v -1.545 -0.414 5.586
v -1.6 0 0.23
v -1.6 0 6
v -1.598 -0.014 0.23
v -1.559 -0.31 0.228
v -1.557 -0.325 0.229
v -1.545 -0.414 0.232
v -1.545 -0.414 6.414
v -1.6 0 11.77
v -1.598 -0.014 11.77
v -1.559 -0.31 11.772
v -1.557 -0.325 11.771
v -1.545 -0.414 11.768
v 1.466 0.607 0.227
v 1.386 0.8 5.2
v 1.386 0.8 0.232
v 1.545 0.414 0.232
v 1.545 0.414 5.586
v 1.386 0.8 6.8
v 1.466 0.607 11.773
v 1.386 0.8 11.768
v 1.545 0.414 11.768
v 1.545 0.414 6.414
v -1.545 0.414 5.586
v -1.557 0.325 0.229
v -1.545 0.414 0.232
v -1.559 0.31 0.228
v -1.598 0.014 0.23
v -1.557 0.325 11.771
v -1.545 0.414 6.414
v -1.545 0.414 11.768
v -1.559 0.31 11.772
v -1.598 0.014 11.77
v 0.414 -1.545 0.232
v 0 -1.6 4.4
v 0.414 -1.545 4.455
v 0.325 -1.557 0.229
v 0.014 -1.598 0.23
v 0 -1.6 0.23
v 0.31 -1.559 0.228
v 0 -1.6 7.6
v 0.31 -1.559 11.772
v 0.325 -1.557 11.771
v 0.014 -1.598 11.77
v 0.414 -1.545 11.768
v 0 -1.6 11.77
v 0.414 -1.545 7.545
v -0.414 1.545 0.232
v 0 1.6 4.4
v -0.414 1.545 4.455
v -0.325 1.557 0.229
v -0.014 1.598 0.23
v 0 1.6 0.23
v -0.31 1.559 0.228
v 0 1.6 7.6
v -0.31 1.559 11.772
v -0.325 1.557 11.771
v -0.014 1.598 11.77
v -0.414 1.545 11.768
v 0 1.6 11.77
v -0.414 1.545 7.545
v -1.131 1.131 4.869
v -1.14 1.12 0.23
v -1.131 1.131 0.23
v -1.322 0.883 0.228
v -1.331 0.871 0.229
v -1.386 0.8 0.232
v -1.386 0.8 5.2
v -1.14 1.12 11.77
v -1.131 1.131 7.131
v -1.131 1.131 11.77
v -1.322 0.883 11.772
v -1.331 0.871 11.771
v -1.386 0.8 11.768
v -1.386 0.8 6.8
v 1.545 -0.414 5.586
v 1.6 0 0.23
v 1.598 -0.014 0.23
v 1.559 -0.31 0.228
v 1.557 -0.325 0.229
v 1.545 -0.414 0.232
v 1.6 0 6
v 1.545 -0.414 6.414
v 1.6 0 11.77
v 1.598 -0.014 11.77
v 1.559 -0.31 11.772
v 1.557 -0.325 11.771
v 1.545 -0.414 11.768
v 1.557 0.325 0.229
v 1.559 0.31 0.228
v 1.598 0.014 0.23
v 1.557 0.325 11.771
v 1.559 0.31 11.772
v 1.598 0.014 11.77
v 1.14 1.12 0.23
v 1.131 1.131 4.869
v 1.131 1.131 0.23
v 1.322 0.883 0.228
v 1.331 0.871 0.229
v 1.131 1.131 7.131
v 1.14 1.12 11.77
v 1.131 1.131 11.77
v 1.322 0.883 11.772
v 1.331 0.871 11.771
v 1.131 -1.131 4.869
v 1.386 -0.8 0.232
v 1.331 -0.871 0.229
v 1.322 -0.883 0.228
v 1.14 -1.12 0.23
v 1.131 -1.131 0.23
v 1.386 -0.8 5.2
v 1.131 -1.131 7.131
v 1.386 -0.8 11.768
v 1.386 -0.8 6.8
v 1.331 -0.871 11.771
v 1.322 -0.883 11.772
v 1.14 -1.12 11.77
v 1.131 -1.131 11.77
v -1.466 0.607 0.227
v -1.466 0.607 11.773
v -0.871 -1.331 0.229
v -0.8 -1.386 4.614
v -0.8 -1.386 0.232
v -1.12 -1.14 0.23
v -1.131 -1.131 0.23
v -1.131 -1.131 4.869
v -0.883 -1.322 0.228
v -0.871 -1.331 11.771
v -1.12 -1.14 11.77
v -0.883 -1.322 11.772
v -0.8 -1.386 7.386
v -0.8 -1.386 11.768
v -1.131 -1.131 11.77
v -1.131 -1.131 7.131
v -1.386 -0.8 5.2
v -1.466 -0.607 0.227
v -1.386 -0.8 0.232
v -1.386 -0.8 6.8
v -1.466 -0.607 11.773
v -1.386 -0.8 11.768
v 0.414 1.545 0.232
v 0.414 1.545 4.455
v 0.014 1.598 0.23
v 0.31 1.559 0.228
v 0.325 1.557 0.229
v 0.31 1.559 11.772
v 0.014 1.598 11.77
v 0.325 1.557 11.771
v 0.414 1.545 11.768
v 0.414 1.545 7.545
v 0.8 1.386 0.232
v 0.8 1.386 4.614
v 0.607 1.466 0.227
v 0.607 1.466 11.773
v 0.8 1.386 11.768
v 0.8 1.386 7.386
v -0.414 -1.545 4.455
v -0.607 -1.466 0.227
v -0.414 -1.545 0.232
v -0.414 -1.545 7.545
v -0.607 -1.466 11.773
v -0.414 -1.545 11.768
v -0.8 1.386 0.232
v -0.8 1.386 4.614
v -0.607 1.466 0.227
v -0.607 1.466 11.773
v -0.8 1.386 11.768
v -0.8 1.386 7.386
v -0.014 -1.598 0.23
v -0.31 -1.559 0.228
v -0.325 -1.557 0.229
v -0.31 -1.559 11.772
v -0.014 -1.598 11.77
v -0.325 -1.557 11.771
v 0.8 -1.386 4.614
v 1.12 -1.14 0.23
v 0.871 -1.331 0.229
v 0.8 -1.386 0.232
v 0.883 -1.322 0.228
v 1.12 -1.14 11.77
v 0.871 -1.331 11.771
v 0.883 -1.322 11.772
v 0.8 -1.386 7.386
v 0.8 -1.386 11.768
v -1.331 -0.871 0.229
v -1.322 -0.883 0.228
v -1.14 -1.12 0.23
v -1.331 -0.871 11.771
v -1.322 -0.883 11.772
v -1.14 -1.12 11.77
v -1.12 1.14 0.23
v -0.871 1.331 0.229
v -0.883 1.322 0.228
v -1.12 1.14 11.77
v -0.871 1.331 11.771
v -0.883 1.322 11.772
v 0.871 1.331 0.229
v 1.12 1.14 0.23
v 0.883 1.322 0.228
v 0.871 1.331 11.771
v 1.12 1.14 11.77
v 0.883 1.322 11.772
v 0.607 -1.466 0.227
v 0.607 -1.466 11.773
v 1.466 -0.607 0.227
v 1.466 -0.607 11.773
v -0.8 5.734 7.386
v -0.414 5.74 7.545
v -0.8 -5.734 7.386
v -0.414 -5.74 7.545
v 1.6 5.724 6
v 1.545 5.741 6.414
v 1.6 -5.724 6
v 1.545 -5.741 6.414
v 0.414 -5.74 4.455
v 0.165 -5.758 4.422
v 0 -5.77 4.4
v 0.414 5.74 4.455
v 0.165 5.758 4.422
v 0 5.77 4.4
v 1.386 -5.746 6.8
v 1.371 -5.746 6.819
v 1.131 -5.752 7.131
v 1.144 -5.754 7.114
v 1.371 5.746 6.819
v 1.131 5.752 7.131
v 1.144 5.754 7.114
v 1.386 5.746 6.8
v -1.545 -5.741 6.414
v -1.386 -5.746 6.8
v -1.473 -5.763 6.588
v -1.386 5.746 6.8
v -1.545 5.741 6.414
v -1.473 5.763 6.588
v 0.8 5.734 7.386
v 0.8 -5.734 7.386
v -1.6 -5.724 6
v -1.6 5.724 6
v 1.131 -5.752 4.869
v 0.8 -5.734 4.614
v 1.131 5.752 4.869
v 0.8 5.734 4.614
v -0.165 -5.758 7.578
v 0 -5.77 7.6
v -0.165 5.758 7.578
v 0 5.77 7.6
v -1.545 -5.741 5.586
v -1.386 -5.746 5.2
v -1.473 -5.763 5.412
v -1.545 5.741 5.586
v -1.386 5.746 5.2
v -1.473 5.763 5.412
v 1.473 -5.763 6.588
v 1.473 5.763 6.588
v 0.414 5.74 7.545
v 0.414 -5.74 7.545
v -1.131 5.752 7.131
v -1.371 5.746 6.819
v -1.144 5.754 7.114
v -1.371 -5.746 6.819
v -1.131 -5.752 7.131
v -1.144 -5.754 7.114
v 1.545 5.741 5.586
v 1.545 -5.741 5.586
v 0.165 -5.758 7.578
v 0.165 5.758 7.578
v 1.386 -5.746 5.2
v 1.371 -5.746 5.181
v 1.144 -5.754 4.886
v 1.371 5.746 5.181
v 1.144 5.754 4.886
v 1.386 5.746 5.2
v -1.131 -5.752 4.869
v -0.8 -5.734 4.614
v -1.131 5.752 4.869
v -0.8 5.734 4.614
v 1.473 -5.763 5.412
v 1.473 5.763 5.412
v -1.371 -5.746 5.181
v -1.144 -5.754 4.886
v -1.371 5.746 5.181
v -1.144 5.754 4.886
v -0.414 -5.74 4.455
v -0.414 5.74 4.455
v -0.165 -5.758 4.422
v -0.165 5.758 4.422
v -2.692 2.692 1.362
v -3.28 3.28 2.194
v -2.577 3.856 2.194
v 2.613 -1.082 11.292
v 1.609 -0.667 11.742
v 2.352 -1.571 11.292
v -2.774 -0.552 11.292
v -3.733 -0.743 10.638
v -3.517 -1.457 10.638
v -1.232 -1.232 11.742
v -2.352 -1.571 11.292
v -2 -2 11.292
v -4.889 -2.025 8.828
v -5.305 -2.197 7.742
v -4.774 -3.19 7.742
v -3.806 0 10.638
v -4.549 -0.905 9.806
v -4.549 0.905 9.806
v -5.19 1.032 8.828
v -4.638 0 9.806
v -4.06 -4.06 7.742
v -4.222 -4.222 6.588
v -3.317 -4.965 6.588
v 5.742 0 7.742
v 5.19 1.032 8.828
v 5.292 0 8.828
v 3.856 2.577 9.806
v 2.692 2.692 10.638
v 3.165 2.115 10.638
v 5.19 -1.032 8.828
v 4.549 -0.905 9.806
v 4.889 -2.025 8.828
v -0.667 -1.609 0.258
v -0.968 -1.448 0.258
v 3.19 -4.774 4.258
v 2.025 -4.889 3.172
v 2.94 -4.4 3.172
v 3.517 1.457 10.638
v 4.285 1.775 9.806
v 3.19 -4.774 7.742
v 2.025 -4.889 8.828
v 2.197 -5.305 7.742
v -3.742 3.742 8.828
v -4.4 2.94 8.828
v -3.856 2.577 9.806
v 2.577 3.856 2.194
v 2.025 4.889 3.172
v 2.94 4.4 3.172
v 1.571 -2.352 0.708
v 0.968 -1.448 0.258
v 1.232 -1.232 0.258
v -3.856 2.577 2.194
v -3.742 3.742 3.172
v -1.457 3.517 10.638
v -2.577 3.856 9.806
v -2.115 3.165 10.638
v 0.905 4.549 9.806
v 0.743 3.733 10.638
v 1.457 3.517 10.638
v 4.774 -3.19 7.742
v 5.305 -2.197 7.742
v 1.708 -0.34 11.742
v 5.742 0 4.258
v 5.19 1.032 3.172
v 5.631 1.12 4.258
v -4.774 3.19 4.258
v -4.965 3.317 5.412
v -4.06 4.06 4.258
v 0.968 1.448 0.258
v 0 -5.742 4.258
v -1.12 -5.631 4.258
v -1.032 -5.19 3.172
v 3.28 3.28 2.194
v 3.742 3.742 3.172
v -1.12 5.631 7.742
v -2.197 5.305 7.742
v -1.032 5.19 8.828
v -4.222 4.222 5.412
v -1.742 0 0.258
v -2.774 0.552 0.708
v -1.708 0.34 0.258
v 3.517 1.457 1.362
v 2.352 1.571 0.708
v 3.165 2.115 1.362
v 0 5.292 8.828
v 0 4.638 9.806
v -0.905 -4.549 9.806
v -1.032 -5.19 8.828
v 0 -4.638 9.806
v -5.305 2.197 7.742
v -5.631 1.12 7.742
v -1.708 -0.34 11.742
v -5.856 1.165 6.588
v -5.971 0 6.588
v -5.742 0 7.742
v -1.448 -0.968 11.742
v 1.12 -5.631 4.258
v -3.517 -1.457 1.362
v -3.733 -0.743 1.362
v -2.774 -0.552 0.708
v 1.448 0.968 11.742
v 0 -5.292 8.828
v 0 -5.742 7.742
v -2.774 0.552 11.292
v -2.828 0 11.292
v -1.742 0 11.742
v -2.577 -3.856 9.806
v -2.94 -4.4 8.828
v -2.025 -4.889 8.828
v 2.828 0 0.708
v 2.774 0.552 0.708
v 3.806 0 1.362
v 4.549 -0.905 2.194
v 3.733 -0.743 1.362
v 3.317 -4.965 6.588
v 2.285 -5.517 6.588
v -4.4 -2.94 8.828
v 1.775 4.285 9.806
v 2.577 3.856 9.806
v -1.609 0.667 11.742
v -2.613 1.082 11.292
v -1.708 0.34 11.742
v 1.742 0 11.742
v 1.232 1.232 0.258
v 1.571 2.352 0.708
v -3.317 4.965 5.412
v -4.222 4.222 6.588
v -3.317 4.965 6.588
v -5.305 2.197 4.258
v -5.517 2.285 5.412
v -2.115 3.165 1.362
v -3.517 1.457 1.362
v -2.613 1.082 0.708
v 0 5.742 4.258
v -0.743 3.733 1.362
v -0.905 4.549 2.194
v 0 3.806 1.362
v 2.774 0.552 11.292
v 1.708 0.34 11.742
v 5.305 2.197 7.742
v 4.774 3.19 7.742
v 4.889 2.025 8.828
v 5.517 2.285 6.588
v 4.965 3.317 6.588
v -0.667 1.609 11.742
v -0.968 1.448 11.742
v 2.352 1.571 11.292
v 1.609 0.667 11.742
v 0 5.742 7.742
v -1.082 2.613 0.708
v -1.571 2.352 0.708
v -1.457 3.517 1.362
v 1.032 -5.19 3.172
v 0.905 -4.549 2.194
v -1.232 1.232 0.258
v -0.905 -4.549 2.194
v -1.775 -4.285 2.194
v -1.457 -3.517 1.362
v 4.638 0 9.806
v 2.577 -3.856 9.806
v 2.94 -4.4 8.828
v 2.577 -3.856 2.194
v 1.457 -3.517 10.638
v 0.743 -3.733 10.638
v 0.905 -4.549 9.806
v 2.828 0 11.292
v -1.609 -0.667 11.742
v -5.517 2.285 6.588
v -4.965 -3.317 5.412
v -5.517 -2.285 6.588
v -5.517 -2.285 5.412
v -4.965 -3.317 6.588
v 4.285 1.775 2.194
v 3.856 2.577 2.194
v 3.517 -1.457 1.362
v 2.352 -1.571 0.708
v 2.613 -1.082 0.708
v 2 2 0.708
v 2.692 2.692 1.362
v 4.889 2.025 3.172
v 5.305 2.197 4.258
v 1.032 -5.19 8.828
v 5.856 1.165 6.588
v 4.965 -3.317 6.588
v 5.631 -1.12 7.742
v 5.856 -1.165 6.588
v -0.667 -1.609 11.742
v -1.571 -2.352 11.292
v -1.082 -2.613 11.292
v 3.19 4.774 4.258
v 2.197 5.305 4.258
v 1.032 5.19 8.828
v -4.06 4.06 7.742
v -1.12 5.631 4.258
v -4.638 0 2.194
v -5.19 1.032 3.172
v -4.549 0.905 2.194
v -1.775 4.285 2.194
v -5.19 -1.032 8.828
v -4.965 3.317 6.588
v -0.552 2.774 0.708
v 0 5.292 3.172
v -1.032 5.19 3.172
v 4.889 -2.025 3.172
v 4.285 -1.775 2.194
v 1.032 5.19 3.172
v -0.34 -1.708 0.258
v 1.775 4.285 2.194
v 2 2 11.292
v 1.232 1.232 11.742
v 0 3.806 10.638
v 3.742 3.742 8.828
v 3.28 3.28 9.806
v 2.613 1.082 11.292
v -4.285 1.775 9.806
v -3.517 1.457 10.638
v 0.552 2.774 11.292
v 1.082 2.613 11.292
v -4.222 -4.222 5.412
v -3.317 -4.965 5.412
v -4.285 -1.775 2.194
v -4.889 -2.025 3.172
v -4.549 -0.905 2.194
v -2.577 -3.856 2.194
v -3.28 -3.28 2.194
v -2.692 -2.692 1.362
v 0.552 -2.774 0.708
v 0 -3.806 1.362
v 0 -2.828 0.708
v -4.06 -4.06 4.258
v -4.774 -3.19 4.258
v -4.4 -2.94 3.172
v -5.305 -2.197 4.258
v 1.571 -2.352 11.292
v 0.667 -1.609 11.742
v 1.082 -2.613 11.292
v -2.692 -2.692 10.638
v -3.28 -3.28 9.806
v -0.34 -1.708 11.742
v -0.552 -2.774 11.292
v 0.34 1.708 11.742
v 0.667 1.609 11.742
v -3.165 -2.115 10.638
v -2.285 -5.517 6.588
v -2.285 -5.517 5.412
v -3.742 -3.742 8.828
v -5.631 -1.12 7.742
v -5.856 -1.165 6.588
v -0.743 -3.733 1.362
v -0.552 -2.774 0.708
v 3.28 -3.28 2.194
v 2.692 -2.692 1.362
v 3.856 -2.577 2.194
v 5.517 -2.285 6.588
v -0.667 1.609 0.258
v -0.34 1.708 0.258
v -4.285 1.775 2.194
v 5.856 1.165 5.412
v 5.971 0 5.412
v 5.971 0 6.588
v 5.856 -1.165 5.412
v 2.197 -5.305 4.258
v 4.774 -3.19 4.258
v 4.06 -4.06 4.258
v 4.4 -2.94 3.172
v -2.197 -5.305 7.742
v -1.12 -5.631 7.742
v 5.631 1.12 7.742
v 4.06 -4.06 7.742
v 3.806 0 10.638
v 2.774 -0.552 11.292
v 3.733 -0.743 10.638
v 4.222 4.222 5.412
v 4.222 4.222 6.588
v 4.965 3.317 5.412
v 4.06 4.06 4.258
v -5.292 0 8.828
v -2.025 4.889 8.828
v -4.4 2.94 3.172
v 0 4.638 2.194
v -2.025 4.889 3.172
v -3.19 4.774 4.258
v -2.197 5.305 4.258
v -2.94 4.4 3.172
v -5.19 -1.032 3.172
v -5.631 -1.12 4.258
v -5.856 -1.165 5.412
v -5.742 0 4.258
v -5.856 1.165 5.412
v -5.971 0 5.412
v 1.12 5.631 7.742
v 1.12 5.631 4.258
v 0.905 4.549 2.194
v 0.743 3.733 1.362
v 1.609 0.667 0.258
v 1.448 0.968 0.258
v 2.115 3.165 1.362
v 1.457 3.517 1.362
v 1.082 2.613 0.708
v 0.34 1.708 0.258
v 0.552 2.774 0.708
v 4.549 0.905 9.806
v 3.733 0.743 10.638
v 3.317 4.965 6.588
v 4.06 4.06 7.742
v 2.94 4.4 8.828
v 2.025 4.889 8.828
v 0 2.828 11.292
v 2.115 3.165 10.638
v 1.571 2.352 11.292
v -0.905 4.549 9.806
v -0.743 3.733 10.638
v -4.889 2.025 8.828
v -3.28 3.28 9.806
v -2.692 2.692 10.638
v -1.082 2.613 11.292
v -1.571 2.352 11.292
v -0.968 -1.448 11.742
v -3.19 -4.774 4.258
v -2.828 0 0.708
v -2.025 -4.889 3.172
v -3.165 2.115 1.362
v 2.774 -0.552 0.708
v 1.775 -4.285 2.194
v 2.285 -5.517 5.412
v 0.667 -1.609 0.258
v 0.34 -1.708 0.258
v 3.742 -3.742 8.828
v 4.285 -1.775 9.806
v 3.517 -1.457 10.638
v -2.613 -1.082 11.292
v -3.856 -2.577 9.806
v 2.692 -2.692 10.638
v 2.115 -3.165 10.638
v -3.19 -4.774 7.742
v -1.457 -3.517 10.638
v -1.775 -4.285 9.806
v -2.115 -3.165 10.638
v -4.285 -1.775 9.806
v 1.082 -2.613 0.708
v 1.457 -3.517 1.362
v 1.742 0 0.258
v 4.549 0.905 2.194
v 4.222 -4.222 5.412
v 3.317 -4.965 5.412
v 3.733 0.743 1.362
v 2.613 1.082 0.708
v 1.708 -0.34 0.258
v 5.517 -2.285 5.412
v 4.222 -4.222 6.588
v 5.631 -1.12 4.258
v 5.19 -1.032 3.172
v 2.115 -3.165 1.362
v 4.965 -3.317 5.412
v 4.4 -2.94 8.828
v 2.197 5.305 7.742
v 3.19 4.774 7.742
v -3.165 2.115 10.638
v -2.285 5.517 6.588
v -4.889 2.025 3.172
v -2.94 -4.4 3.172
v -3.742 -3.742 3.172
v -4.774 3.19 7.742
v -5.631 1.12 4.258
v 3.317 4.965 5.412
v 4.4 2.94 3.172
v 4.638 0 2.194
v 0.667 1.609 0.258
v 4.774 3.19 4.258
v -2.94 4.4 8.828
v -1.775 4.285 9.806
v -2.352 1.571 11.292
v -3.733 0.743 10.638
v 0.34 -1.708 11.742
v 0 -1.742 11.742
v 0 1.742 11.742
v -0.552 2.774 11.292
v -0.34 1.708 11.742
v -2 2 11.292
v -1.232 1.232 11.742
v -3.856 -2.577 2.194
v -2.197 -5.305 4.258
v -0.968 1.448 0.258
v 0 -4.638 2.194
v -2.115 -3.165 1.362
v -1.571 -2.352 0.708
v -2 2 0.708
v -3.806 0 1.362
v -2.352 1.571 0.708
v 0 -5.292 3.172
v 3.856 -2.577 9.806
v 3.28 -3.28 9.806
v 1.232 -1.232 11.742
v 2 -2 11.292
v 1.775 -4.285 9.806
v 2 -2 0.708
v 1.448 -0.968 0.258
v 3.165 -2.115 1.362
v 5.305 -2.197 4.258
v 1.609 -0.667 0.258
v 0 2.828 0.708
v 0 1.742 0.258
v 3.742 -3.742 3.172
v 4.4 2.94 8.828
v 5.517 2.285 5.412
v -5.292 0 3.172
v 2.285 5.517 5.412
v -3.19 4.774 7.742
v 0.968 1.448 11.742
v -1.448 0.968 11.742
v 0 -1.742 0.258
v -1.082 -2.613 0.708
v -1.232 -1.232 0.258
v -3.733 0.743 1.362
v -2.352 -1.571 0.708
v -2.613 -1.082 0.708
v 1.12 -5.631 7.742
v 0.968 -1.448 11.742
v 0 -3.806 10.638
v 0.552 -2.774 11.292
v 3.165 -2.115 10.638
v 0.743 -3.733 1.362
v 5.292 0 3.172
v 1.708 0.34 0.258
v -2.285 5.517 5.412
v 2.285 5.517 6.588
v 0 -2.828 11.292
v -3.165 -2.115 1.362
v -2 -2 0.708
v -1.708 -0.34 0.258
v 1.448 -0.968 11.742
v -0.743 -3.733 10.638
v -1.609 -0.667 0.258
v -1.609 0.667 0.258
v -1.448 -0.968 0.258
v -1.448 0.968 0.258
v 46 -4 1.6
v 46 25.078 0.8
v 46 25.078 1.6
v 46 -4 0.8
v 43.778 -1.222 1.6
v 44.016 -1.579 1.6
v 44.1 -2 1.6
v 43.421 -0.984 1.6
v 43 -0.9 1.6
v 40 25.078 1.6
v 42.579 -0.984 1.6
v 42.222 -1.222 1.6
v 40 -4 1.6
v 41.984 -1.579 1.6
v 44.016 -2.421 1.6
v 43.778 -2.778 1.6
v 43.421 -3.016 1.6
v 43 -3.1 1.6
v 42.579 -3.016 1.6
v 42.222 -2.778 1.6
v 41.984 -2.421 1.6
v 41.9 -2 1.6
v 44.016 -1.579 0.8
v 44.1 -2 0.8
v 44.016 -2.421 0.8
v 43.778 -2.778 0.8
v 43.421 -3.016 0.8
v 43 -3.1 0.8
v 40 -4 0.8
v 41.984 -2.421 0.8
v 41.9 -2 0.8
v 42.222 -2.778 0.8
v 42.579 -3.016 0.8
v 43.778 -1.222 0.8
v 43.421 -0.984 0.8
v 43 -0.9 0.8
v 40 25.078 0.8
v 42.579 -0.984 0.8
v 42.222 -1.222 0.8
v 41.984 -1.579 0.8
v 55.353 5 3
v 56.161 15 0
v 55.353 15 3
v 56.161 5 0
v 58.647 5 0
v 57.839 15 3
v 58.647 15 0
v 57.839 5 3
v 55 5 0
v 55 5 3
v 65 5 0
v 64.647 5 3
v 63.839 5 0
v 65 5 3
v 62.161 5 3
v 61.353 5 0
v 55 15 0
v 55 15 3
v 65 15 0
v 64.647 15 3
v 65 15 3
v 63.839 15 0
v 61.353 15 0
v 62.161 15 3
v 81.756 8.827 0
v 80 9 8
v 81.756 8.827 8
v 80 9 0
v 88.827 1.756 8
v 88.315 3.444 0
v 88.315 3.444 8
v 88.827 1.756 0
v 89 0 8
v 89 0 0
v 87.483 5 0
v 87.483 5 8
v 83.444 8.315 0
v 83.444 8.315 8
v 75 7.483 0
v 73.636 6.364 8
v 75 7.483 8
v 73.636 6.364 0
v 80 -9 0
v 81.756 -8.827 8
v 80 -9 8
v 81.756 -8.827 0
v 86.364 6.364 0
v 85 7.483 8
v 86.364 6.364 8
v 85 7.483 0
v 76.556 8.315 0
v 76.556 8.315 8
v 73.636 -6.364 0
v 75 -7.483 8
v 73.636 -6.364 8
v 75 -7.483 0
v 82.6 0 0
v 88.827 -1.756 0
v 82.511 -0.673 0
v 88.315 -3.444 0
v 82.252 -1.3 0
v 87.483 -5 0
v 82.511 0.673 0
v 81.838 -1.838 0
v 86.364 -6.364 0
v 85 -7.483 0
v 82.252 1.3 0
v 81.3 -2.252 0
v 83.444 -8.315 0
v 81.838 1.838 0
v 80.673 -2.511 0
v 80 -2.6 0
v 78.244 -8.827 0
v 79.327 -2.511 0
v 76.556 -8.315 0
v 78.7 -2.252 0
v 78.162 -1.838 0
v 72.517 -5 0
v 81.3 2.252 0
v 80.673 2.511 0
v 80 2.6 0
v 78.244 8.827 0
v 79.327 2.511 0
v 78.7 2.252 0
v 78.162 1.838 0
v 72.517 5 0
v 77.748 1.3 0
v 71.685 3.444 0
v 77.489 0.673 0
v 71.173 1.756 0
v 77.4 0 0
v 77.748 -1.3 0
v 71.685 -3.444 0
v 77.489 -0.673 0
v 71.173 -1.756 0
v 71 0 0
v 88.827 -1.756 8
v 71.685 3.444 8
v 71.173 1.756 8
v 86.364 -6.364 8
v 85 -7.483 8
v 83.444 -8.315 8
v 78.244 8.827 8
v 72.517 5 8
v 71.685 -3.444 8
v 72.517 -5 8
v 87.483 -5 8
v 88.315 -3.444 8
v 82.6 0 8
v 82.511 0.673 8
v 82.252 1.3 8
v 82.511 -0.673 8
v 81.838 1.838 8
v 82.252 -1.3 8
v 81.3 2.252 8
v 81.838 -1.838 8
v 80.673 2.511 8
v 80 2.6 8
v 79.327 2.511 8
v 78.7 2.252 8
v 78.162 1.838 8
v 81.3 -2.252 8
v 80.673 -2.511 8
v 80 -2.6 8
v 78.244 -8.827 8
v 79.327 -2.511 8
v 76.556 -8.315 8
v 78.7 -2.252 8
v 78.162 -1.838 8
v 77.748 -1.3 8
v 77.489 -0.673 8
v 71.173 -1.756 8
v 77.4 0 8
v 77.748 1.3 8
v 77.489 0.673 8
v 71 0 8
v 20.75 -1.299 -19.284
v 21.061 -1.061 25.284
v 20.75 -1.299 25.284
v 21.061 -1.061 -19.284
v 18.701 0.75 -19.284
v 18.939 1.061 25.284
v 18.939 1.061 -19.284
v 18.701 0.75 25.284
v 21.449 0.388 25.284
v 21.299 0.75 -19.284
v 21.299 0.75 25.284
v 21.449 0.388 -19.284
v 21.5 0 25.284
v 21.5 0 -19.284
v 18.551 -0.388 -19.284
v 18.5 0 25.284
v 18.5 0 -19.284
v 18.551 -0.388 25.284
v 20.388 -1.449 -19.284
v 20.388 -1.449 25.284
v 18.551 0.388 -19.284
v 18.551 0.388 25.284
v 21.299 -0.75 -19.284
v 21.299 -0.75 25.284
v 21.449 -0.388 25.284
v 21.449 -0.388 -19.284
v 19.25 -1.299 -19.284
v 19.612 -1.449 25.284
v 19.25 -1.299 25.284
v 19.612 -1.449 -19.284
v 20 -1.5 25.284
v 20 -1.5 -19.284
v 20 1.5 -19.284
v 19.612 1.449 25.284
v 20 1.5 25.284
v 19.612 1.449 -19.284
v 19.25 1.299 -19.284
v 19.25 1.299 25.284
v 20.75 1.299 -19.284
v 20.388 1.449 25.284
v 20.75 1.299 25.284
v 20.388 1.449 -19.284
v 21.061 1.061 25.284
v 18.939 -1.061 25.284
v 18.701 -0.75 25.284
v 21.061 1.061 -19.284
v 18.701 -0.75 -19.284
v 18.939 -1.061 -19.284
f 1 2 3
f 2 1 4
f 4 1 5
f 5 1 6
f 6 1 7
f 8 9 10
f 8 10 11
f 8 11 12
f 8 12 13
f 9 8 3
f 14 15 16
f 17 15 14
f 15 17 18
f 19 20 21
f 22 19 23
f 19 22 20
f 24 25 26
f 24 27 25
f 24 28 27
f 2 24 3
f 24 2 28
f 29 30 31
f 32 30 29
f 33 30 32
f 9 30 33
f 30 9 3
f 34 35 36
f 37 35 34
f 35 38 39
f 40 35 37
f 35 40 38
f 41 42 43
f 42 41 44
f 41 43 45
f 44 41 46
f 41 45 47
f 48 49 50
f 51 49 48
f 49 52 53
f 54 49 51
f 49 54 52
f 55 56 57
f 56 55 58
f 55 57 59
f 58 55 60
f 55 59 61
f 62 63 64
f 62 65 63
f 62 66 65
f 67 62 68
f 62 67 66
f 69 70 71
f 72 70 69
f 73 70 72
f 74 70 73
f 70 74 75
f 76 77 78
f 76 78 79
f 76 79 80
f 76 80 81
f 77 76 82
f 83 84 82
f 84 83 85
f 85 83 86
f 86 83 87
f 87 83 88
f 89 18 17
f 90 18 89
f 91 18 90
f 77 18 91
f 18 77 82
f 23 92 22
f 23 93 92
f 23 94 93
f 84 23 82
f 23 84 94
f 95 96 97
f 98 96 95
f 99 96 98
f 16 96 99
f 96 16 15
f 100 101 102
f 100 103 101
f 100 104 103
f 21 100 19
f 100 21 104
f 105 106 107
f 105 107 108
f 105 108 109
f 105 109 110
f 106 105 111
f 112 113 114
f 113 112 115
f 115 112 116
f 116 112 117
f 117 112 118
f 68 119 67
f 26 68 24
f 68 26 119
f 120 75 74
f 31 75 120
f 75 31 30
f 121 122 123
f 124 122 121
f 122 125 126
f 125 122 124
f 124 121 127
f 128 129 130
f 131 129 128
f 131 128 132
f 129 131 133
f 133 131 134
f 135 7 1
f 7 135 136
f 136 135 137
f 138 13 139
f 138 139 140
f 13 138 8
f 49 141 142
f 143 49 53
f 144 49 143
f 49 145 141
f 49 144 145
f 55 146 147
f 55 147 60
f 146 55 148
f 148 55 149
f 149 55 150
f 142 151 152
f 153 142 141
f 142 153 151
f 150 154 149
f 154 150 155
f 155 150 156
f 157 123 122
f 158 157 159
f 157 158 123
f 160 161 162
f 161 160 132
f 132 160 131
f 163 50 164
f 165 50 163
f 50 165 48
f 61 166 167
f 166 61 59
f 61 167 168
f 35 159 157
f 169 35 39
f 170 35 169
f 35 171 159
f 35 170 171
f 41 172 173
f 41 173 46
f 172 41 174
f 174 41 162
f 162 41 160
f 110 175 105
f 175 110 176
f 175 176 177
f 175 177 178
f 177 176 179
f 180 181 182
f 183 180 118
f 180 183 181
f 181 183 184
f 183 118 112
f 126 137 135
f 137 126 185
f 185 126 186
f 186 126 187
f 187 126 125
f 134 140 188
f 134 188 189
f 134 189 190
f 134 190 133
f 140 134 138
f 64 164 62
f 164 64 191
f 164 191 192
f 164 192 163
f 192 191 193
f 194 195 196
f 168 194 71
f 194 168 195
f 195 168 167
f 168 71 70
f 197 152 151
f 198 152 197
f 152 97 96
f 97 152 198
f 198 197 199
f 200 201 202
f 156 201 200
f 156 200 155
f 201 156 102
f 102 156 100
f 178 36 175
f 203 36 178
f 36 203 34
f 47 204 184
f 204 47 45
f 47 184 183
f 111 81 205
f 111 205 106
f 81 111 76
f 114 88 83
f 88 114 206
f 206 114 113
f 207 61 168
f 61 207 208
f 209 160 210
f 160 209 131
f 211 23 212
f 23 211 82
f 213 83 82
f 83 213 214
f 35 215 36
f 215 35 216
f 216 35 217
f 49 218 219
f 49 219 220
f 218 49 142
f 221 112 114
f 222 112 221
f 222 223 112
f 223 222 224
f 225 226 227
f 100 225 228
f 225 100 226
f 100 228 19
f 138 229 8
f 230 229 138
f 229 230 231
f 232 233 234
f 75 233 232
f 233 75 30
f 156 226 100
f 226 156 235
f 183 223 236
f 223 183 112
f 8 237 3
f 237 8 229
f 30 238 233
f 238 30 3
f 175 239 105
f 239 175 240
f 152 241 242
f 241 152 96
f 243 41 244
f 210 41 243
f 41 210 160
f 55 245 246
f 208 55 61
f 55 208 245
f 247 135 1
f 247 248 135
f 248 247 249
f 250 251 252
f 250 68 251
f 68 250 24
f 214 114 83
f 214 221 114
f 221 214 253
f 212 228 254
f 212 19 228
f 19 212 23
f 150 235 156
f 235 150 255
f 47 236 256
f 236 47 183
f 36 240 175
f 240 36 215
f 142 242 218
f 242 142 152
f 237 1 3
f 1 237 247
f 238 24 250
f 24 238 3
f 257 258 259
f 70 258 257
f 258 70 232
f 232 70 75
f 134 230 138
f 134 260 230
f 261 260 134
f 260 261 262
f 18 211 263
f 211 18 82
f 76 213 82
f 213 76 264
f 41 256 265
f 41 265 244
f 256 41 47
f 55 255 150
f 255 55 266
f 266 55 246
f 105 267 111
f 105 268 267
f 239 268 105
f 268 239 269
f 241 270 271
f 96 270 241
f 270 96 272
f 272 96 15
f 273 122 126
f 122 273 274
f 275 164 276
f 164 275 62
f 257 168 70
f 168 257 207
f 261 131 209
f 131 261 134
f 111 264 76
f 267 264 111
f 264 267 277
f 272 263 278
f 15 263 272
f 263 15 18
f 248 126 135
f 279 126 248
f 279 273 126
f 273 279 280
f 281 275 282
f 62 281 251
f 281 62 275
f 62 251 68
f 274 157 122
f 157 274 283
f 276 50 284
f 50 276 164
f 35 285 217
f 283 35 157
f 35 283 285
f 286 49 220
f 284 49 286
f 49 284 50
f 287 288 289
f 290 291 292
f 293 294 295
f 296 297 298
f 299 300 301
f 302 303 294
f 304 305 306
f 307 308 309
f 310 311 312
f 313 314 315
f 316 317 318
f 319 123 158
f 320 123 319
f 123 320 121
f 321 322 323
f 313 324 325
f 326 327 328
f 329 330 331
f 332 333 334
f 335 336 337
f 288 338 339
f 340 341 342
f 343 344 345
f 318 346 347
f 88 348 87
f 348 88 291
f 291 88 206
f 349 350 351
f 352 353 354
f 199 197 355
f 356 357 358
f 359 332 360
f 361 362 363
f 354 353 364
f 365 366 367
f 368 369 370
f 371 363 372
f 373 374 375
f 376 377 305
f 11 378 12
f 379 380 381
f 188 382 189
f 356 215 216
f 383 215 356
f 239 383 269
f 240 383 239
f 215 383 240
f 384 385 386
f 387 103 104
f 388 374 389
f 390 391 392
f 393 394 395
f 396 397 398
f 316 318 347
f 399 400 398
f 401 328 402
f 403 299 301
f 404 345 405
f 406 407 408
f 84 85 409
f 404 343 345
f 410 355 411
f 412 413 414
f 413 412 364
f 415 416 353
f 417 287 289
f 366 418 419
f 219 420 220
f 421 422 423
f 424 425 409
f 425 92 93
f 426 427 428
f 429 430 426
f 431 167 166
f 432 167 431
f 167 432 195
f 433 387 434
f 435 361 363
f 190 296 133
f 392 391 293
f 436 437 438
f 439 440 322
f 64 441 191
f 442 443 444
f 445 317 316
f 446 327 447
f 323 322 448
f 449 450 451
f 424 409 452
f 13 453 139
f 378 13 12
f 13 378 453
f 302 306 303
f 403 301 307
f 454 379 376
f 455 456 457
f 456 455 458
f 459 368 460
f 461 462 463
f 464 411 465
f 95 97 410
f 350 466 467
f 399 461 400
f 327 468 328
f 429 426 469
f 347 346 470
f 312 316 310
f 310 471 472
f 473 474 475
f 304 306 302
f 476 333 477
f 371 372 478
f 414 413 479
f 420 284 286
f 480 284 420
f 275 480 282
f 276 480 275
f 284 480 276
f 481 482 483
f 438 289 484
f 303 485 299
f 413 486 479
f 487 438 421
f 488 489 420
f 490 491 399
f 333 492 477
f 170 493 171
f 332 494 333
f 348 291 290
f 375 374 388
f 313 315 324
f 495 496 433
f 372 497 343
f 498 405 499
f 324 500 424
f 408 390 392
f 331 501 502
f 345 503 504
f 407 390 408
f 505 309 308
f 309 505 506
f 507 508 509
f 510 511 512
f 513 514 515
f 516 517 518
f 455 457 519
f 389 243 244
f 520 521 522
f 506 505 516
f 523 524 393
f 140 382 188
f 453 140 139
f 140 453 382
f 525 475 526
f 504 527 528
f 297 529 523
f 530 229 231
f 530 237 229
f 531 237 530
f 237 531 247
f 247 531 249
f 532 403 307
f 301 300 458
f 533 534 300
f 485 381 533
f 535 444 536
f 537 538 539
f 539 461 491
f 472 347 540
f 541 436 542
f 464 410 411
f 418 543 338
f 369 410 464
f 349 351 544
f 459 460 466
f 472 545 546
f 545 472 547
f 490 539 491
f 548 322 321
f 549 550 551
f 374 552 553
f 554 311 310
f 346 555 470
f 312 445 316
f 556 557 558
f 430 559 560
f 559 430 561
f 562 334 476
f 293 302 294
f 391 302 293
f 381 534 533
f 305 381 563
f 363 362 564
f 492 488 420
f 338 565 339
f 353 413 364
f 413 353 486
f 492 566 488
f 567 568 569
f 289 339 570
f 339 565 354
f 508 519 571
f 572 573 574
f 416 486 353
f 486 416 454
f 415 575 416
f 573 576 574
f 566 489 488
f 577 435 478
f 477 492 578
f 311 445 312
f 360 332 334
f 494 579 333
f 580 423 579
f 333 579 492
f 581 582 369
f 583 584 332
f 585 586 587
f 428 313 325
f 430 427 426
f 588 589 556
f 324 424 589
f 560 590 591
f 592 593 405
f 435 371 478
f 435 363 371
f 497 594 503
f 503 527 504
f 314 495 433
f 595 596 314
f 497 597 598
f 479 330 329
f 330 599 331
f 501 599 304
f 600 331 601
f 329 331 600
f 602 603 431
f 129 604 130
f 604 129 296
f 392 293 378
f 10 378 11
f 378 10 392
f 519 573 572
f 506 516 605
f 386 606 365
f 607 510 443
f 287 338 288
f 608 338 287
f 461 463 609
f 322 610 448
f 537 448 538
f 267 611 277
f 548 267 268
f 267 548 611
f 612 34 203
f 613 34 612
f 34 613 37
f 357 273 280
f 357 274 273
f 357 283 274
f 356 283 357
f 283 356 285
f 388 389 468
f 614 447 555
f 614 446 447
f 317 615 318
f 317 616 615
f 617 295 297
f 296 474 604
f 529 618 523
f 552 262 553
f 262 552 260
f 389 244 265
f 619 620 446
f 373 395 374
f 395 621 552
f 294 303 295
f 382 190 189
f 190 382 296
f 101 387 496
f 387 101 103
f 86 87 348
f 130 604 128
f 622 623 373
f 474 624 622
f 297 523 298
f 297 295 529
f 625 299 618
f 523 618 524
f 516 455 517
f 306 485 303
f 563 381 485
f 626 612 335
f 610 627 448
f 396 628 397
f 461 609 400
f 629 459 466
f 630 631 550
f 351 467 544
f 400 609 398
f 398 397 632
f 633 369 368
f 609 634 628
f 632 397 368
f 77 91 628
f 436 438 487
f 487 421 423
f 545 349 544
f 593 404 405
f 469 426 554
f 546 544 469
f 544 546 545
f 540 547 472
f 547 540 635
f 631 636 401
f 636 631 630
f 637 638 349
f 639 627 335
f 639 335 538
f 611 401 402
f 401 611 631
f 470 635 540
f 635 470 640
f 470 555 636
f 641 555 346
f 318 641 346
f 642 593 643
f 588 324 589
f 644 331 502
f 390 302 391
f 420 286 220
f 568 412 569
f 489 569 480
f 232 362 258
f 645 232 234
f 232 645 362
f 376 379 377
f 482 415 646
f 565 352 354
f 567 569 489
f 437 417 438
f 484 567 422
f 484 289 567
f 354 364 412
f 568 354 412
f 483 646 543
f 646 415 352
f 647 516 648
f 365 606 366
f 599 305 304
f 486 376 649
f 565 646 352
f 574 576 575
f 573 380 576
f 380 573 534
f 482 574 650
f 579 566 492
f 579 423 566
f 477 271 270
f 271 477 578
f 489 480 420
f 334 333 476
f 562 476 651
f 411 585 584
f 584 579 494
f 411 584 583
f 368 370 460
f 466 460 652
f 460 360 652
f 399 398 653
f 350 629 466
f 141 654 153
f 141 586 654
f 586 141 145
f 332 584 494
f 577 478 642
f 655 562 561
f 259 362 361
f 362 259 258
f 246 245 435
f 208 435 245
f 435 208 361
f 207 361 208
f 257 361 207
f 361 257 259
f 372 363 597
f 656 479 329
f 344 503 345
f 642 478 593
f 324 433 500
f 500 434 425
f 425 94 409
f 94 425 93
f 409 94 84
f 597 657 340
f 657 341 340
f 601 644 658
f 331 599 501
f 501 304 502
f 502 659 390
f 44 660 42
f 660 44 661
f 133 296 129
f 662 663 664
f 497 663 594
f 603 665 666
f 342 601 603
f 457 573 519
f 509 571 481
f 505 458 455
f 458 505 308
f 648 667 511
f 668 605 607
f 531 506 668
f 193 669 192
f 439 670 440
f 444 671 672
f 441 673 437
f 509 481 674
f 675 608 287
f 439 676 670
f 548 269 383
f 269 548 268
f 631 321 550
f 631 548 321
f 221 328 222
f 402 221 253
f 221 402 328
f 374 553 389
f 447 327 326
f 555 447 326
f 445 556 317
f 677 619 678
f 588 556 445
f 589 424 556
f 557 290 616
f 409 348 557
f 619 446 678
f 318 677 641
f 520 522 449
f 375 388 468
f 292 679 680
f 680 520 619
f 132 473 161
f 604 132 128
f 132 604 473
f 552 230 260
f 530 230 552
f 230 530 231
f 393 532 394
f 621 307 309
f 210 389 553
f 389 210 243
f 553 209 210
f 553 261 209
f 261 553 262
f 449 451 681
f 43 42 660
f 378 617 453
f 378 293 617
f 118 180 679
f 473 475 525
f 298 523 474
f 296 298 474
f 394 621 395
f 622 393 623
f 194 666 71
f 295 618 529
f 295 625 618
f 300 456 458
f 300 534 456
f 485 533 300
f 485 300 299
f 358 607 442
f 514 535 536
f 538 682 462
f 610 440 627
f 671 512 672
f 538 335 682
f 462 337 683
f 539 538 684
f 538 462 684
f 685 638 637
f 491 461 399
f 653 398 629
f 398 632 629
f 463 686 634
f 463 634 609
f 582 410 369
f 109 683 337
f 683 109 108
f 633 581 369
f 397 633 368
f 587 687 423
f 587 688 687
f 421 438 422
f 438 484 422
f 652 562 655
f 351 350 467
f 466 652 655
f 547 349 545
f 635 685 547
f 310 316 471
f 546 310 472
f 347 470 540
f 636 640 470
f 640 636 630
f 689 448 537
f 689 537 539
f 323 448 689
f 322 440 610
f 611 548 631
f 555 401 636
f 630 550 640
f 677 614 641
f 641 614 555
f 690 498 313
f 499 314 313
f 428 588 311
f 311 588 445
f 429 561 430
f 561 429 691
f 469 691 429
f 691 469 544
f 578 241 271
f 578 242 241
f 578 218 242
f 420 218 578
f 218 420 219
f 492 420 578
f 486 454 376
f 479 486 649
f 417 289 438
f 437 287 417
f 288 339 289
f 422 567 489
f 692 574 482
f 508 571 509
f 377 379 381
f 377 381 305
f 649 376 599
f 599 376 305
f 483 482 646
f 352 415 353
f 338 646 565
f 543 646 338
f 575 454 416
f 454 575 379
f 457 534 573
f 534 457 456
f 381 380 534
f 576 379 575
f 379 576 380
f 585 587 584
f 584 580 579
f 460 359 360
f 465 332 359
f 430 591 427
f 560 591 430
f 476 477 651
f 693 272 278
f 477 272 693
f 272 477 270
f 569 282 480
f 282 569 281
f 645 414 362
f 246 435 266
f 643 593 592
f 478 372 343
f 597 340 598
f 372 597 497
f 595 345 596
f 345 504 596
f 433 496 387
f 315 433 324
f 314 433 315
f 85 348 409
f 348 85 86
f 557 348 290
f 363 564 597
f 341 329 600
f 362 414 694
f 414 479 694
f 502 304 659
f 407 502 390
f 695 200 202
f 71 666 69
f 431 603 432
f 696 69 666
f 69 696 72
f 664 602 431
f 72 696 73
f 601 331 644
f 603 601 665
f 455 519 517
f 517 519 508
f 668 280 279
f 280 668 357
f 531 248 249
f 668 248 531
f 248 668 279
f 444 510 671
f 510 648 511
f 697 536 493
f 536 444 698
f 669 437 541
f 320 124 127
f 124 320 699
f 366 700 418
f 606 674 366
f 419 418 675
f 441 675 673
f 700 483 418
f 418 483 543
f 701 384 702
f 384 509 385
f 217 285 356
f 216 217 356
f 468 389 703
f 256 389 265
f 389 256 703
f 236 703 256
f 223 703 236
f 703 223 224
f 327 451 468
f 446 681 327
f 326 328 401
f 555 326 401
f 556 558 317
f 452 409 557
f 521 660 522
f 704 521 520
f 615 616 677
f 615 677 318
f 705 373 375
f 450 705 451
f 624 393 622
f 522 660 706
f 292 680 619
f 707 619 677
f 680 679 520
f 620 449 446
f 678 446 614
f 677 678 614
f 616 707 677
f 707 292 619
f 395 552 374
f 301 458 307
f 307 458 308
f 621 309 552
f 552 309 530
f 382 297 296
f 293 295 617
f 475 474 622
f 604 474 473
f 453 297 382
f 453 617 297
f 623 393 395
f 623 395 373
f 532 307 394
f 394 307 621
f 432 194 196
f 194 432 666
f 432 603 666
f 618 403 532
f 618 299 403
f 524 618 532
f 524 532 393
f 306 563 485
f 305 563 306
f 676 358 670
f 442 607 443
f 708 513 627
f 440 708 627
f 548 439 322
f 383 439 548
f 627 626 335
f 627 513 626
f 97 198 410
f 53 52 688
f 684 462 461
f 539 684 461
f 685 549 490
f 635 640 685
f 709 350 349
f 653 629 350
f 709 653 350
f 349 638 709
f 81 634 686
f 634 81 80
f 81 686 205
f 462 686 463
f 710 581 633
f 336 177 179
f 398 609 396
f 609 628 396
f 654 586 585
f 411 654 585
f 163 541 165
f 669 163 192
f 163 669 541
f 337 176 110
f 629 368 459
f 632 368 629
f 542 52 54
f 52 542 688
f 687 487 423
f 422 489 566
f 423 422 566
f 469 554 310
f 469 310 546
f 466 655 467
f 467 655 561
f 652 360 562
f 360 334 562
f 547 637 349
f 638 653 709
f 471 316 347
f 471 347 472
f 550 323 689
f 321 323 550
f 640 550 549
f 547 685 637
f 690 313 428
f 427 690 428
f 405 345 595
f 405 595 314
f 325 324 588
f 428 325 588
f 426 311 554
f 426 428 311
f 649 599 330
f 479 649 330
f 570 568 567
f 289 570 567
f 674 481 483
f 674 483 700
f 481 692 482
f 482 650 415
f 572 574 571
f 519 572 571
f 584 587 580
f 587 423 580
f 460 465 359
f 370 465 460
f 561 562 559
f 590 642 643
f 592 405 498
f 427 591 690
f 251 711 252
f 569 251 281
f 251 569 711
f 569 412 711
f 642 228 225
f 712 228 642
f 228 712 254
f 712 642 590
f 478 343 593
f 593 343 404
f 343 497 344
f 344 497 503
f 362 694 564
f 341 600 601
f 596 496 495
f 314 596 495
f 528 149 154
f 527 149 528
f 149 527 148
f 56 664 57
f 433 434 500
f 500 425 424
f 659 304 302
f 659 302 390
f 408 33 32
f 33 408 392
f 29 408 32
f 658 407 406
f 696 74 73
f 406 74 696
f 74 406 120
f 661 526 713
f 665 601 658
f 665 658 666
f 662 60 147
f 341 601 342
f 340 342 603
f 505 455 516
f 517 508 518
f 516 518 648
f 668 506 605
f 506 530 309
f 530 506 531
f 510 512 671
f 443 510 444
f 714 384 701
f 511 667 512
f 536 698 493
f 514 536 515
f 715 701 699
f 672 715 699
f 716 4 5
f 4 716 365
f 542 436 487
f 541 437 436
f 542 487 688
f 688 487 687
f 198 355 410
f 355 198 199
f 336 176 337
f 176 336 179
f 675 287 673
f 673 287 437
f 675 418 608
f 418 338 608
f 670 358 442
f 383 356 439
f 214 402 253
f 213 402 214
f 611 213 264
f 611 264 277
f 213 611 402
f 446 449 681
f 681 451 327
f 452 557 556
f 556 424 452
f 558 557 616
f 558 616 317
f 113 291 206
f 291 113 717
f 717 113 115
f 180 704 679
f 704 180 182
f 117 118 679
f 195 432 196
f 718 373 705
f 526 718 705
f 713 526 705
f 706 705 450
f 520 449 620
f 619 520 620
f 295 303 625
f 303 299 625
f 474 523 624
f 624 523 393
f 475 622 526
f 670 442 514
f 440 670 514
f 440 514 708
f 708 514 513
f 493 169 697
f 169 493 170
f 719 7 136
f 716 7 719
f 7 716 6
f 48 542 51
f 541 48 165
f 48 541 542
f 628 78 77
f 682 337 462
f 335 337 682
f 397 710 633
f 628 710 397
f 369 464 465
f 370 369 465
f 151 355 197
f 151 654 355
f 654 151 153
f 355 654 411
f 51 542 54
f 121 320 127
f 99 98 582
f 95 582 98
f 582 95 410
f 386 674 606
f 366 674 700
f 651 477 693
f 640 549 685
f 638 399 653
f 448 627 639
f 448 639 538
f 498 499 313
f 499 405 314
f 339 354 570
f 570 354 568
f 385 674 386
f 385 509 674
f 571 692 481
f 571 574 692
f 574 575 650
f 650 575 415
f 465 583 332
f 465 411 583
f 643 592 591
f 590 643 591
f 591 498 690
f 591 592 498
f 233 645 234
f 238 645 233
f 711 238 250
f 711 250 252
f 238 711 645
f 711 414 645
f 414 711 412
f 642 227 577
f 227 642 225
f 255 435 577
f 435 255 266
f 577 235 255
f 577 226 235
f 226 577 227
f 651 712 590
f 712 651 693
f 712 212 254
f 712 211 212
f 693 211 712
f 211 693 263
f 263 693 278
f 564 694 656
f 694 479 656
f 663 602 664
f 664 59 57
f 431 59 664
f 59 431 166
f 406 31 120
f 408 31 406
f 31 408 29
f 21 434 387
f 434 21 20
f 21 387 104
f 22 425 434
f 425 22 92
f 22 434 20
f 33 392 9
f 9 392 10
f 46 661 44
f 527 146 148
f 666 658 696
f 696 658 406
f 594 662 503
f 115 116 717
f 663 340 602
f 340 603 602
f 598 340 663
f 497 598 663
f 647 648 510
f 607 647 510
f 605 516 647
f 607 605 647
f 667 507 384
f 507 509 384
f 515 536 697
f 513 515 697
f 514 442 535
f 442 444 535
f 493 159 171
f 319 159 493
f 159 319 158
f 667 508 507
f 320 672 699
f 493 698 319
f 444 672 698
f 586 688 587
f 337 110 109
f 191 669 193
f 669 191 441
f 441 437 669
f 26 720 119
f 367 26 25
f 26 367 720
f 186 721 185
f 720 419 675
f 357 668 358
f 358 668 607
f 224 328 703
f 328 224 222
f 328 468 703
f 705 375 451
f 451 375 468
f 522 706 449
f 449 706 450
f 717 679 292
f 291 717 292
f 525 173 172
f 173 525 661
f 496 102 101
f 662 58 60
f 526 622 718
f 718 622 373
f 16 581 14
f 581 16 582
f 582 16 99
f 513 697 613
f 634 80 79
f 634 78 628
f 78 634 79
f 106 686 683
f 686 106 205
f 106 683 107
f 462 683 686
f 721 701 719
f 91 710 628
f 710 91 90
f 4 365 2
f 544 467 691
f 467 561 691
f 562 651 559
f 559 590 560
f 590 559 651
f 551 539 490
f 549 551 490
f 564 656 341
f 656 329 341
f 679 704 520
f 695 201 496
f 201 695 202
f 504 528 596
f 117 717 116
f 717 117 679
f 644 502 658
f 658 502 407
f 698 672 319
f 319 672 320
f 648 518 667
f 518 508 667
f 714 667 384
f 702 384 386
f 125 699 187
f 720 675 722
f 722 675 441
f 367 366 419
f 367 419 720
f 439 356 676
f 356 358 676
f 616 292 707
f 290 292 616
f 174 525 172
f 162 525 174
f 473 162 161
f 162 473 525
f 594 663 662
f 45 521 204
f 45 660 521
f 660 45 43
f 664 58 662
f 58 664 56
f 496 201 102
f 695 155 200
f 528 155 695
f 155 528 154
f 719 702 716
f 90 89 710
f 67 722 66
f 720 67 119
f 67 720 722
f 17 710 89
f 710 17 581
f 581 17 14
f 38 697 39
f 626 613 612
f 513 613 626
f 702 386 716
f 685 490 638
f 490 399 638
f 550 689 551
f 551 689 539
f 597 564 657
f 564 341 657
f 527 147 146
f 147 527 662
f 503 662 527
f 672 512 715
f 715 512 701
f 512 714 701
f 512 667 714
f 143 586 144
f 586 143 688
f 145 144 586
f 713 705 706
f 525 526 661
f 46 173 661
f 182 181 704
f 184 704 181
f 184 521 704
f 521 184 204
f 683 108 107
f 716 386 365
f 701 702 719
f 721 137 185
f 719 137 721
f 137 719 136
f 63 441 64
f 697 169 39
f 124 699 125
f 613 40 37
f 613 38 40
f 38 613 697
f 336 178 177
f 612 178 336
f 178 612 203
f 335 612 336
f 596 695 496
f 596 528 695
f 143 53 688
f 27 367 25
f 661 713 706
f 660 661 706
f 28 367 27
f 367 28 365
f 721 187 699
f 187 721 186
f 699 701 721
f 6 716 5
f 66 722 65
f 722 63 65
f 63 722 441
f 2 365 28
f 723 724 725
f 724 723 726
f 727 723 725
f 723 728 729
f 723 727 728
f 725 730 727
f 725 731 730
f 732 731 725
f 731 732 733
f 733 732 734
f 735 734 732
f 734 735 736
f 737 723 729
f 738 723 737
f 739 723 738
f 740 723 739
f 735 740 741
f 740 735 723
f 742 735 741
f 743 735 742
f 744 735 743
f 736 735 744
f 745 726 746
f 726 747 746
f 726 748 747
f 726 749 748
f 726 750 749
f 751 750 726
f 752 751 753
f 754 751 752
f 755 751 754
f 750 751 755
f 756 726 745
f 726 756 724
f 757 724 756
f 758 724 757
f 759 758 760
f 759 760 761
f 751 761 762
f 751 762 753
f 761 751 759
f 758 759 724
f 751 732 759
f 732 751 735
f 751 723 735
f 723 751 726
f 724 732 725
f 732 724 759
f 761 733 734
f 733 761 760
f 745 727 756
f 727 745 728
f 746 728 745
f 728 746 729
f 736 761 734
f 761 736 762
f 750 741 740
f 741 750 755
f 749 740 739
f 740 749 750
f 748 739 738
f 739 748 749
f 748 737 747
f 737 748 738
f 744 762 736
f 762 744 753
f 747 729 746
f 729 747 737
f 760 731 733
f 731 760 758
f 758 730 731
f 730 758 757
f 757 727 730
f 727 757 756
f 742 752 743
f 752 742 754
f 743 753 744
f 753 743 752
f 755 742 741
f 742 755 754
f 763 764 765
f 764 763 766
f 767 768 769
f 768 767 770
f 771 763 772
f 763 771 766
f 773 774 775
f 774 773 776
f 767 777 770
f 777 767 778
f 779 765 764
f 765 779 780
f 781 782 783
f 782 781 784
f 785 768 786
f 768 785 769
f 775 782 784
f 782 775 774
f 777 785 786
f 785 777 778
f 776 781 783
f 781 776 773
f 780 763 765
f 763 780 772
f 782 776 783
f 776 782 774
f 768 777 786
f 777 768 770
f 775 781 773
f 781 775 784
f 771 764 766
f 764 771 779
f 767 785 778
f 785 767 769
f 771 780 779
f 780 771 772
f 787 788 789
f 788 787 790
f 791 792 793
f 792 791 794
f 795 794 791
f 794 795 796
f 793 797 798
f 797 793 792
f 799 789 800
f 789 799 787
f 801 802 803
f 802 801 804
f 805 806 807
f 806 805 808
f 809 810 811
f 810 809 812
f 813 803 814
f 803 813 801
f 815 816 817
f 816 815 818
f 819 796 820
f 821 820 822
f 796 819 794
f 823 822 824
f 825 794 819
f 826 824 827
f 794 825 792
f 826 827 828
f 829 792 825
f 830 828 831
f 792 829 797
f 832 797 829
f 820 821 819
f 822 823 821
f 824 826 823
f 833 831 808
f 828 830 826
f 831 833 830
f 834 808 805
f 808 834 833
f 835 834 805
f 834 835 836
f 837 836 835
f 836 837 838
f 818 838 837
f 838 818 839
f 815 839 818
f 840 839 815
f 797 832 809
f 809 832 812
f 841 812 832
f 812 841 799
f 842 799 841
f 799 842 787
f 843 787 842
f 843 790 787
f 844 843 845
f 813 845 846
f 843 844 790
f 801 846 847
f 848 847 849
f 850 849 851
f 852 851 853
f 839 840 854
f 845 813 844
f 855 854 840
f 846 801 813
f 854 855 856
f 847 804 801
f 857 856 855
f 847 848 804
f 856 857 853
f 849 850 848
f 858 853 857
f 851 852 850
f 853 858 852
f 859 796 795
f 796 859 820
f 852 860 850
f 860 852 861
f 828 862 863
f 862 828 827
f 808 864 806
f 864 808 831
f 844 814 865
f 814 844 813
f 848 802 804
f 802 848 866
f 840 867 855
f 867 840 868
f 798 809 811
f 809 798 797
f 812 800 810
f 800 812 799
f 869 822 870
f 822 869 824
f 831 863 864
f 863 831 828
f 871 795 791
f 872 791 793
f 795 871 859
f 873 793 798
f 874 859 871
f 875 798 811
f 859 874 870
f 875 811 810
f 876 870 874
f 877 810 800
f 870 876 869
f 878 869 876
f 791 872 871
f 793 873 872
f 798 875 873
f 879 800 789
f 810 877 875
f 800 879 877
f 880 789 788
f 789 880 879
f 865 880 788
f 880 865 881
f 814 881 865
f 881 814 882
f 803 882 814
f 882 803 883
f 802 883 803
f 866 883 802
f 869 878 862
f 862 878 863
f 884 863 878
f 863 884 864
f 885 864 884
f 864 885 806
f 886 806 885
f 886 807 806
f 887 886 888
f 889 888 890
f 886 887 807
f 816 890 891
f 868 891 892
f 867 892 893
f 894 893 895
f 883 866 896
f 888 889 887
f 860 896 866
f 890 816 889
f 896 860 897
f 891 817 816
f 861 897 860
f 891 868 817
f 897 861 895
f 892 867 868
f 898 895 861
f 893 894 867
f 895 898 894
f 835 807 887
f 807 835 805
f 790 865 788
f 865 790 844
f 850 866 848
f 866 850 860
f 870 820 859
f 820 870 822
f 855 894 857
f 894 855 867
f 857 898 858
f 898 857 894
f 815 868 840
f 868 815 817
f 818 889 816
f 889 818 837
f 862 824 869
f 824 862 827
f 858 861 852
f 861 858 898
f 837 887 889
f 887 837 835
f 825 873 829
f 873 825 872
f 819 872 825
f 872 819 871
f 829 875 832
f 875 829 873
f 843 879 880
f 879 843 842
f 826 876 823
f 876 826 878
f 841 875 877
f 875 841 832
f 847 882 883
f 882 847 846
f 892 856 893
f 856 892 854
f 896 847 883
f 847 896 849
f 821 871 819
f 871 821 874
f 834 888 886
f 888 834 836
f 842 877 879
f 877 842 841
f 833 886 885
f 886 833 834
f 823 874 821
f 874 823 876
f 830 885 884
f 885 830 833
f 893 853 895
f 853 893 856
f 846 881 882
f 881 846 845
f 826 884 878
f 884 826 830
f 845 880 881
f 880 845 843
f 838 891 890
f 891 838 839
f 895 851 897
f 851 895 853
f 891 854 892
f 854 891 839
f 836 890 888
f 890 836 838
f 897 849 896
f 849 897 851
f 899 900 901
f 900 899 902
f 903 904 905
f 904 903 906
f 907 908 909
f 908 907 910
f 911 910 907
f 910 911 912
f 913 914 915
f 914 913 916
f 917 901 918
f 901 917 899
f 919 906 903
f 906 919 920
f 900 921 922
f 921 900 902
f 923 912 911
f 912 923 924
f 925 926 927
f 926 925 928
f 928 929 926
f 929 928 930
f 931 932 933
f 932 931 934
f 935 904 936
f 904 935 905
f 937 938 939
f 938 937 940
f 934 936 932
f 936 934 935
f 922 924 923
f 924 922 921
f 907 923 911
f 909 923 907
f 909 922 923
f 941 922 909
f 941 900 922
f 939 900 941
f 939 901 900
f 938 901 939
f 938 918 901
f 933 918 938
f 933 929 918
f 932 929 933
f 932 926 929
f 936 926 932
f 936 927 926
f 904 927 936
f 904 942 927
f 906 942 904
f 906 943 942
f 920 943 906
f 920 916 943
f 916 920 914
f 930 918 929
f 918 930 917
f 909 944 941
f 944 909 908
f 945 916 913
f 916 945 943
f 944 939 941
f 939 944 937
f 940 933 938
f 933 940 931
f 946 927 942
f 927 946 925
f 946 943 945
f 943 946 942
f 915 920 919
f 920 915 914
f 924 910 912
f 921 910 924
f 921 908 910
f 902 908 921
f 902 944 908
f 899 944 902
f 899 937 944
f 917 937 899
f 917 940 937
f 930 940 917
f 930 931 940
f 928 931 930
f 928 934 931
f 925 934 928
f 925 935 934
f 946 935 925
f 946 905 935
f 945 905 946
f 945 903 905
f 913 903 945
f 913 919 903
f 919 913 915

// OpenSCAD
// Octahedral Shape Instrument v1 — bistable strut demonstrator
// CC0 — JinnZ2 ecosystem, GBCB-emitter-compatible OpenSCAD
// Print: 6 vertex nodes, 10 rigid struts (edges), 1 bistable strut (2 beams + apex cap),
// 1 compression screw collar. Assembly = octahedron; edge (0,2) = snap-through element.
//
// Geometry: octahedron vertices at (±s,0,0),(0,±s,0),(0,0,±s); 12 edges, length s*sqrt(2).
// The bistable strut is a von Mises truss: two inclined beams meeting at an apex;
// apex height h0 sets the two stable states (up/down snap-through).

s         = 40;    // octahedron half-size (mm)
node_r    = 6;     // vertex node radius
socket_d  = 3.2;   // strut socket diameter (3mm rod + clearance)
rod_d     = 3.0;   // rigid strut rod diameter
beam_w    = 6;     // snap-beam width (print direction = flat)
beam_t    = 0.8;   // snap-beam thickness — sets snap force; tune 0.6–1.2
beam_apex = 6;     // snap-beam apex height — sets bistability well separation
screw_d   = 5.2;   // M5 compression screw clearance

// ---------- derived ----------
edge_len = s*sqrt(2);
beam_len = edge_len/2 - node_r;   // each snap beam spans node->midpoint
beam_angle = atan(beam_apex / beam_len);

// ---------- vertex node: sphere with 4 orthogonal axial sockets ----------
module vertex_node() {
    difference() {
        sphere(r=node_r, $fn=32);
        // 4 sockets in the plane perpendicular to the node's own axis (octahedral
        // incidence = 4 edges, all at 90 deg to each other in that plane).
        // Mount node with its axis along the load direction, then rotate 45 deg
        // at assembly so sockets aim at the 4 neighboring vertices.
        for (a=[0:90:270])
            rotate([a,0,0]) translate([0,0,-node_r-1])
                cylinder(d=socket_d, h=node_r*2+2, $fn=24);
    }
}

// ---------- rigid strut ----------
module rigid_strut(len) {
    cylinder(d=rod_d, h=len, center=true, $fn=24);
}

// ---------- bistable strut: von Mises truss, printed flat, folds at apex ----------
module snap_beam() {
    // single inclined beam with root tab and apex tab
    L = beam_len/cos(beam_angle);
    difference() {
        union() {
            cube([beam_w, L, beam_t]);                        // beam body
            translate([0,-4,0]) cube([beam_w,4+2,beam_t]);    // root tab (into node socket)
            translate([0,L-2,0]) cube([beam_w,4,beam_t]);     // apex tab
        }
        // root pin hole
        translate([beam_w/2,-2,-1]) cylinder(d=2.2,h=beam_t+2,$fn=16);
    }
}
module apex_cap() {
    // joins the two beam apexes; central pad takes probe impulse (flick point / accelerometer mount)
    difference() {
        cube([beam_w+4, 10, 3], center=true);
        for (sg=[-1,1]) translate([sg*(beam_w/2),0,0])
            rotate([0,sg*beam_angle,0]) cube([2.4,10,5], center=true);
    }
}

// ---------- compression collar: opposite vertex (0,1 pair) gets screw drive ----------
module compression_collar() {
    difference() {
        cylinder(r=node_r+3, h=8, center=true, $fn=32);
        cylinder(d=screw_d, h=10, center=true, $fn=24);   // M5 nut trap or thread-forming
    }
}

// ---------- layout for printing ----------
translate([0,0,node_r])   vertex_node();                       // x6 (reuse plate)
translate([20,0,rod_d])   rigid_strut(edge_len-2*node_r);      // x10 (rotate to print vertically)
translate([40,0,beam_t])  snap_beam();                         // x2
translate([60,10,1.5])    apex_cap();                          // x1
translate([80,0,4])       compression_collar();                // x2 (both antipodal nodes of load axis)
